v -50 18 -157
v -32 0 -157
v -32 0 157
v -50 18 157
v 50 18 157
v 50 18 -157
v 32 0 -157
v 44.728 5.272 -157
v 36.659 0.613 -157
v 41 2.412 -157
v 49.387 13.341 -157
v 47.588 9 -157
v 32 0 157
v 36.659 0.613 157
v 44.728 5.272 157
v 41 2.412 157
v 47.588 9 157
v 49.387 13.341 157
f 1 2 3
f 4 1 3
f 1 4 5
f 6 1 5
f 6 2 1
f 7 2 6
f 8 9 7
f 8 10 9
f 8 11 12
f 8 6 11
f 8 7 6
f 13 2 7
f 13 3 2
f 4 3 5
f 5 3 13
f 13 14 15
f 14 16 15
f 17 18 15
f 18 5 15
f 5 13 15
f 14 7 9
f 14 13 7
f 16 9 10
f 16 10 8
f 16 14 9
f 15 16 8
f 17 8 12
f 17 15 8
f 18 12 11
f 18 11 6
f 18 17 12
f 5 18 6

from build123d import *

# Parameters (mm, degrees)
F0_W     = 100
F0_H     = 314
F1_DEPTH = 18
F2_SIZE  = 17.99999
F3_R     = 17.99999


# Not quite as in the source:
# - a fillet or chamfer is up to 0.001 mm smaller than in the source, because OpenCascade refuses the exact size


with BuildPart() as f1:
    # F0 (on Front) → F1 (new body)
    with BuildSketch(Plane.XZ):
        Rectangle(F0_W, F0_H)
    extrude(amount=-F1_DEPTH)

    # F2 (size 18 in the source; OpenCascade refuses exactly that, so slightly less here)
    f2_edges = [f1.edges().sort_by_distance(p)[0] for p in [
        (-50, 0, 0),
    ]]
    chamfer(f2_edges, length=F2_SIZE)

    # F3 (radius 18 in the source; OpenCascade refuses exactly that, so slightly less here)
    f3_edges = [f1.edges().sort_by_distance(p)[0] for p in [
        (50, 0, 0),
    ]]
    fillet(f3_edges, radius=F3_R)


solid = f1.part
